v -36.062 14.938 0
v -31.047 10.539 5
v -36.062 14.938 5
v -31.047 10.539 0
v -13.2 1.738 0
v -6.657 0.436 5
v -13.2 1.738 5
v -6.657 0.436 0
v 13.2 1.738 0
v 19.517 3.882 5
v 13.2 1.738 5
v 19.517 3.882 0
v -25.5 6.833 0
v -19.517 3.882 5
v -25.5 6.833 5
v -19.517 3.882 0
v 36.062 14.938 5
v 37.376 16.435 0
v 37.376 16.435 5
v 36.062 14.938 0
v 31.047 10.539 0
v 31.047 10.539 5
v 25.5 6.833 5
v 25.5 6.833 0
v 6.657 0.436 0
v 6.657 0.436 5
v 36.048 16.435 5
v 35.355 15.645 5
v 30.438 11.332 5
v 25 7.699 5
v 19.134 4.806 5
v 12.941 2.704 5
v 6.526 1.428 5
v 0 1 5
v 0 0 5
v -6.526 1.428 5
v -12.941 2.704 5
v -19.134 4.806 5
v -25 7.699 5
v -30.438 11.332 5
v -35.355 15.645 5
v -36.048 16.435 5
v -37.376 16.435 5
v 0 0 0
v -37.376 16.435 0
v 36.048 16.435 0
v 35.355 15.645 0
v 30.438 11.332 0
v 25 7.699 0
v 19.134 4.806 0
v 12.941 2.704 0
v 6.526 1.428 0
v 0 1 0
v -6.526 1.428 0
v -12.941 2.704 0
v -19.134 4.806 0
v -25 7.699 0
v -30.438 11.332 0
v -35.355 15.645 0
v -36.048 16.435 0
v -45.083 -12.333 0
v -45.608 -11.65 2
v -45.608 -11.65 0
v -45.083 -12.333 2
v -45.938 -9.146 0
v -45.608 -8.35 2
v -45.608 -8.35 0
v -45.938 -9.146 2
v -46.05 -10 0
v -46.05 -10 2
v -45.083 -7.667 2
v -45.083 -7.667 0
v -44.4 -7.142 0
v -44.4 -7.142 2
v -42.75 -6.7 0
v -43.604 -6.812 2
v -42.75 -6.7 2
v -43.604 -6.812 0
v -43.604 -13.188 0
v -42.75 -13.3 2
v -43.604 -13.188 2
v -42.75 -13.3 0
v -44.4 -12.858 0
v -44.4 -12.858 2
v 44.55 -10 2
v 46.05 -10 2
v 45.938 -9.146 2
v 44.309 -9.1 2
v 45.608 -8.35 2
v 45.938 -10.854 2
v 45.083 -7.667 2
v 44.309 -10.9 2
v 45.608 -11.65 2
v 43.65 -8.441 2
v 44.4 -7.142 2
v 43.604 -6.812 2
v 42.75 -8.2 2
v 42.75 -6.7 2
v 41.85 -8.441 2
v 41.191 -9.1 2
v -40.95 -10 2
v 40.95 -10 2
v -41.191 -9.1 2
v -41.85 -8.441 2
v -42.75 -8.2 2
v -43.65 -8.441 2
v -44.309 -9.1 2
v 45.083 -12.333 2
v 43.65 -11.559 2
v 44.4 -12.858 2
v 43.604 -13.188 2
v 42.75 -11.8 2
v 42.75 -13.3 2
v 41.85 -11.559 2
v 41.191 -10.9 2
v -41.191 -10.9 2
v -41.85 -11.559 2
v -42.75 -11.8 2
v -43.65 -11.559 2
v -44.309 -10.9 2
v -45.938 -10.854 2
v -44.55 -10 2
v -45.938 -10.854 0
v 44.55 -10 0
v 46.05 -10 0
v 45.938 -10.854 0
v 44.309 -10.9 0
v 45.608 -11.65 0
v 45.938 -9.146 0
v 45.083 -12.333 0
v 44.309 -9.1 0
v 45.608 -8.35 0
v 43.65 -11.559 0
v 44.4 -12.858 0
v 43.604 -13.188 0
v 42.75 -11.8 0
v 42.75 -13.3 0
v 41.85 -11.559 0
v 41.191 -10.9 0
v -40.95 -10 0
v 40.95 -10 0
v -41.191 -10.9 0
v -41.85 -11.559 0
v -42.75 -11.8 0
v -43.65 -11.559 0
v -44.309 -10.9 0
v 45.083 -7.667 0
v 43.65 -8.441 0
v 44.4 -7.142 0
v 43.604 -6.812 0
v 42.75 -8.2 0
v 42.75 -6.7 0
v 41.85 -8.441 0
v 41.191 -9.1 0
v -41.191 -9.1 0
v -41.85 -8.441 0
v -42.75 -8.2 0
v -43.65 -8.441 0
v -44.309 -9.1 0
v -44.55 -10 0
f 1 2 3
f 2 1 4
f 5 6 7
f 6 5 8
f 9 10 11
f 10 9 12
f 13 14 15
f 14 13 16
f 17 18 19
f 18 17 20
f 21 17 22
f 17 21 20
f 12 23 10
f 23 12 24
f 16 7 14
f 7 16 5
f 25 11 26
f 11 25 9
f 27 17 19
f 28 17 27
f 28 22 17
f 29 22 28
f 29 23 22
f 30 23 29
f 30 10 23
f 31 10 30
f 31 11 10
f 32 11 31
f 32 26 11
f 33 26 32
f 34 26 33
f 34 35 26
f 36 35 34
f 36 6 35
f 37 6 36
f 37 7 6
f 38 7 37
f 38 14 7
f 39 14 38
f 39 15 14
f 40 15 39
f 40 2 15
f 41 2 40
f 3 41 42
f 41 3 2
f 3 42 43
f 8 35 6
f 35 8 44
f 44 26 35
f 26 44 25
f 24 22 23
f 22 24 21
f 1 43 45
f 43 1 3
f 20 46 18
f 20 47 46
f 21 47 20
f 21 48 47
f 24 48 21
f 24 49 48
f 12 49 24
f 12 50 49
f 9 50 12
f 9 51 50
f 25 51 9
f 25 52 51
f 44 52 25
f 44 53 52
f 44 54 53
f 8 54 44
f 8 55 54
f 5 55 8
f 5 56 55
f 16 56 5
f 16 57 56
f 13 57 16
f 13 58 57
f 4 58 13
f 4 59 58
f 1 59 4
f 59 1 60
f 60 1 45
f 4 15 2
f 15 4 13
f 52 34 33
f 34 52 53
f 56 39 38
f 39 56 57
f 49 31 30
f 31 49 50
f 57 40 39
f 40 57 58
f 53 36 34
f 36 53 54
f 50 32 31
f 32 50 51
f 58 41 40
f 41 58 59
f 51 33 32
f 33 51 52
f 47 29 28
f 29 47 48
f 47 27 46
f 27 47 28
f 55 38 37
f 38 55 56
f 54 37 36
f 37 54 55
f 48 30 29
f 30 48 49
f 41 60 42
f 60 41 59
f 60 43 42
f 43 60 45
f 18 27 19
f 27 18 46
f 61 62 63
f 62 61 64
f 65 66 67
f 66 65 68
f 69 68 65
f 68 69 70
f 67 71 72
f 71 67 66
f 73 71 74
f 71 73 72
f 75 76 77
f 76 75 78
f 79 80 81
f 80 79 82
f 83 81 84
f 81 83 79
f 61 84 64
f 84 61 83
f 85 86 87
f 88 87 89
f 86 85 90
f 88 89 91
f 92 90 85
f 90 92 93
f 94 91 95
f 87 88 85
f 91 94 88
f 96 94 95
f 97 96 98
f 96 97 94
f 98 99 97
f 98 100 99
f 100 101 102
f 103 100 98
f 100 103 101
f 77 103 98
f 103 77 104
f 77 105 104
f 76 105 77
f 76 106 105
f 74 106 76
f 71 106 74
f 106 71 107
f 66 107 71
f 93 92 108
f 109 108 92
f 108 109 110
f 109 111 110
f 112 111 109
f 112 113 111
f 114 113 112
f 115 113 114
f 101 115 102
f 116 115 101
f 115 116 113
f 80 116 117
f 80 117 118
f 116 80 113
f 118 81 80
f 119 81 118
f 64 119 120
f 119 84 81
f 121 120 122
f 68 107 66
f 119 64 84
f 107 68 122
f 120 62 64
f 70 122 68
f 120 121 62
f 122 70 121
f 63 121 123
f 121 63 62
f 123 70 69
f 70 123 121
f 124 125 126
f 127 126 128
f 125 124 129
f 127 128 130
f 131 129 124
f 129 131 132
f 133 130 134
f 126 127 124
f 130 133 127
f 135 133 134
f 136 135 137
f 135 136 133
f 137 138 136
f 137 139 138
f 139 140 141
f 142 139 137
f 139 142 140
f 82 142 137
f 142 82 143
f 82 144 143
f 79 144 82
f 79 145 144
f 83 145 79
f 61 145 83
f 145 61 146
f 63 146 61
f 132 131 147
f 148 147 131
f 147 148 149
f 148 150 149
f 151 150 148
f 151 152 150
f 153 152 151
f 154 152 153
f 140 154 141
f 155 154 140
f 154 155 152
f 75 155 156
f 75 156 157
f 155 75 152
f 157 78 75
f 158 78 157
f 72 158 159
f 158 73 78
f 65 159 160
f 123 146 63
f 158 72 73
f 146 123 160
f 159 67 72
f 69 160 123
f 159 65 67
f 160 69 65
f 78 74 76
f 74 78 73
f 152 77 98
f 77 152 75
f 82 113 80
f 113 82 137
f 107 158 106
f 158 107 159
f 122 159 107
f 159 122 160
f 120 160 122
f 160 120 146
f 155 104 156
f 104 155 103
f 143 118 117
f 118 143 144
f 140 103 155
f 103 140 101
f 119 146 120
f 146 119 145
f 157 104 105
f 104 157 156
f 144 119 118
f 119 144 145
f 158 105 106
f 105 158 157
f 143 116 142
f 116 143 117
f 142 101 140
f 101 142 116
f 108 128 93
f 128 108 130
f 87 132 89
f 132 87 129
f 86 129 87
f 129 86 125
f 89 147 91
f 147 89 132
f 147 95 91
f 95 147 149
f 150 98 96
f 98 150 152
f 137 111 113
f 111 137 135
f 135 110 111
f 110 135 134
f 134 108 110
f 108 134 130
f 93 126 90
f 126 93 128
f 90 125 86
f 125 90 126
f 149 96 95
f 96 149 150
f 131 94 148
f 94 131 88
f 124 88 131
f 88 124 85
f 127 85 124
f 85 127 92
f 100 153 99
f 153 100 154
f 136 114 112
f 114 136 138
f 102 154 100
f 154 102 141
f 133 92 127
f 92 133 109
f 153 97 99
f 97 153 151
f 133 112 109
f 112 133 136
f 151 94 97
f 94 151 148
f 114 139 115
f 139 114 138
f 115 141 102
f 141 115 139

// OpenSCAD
$fn = 24;
thickness = 2;//3;

module curve() {
	inner = 100;
	outer = inner + thickness;
	half = outer/2;
	width = 75;
	height = 5;//43;

	// r * sin(t) = width / 2;
	// t = asin(width / 2 / r);
	//
	// offset = r * cos(t);
	offset = half * cos( asin(width/2/half) );

	translate([0, half-offset, 0])
		difference() {
			translate([0, offset, 0]) {
				difference() {
					cylinder(d=outer, h=height, $fn=$fn*2);
					translate([0, 0, -1])
						cylinder(d=inner, h=height+2, $fn=$fn*2);
				}
			}
			translate([-half-1, 0, -1])
				cube([outer+2, outer, height+2]);
		}

		/* Markers to test the correctness of the offset calculation
		translate([-width/2-thickness, 0, 0])
			cube([thickness, half-offset, height]);
		translate([width/2, 0, 0])
			cube([thickness, half-offset, height]);
		*/
}

module tab(hole, wall) {
	size = hole + wall;
	half = size / 2;

	difference() {
		union() {
			cylinder(d=size, h=thickness);

			translate([-half, -half, 0])
				cube([half, size, thickness]);
		}
		translate([0, 0, -1])
			cylinder(d=hole, h=thickness+2, $fn=$fn/2);
	}
}

module tabs() {
	distance = 85.5;
	half = distance / 2;
	hole = 3.6; // 6-32 screw = 0.138 in = 3.5052 mm
	wall = 3;//10;

	translate([-half, 0, 0])
		mirror([1, 0, 0])
			tab(hole, wall);

	translate([half, 0, 0])
		tab(hole, wall);

	size = hole + wall;

	translate([-half+size/3, -size/2, 0])
		#cube([distance-size/1.5, size, thickness]);
}

curve();

translate([0, -10, 0])
	tabs();
/*
*/
